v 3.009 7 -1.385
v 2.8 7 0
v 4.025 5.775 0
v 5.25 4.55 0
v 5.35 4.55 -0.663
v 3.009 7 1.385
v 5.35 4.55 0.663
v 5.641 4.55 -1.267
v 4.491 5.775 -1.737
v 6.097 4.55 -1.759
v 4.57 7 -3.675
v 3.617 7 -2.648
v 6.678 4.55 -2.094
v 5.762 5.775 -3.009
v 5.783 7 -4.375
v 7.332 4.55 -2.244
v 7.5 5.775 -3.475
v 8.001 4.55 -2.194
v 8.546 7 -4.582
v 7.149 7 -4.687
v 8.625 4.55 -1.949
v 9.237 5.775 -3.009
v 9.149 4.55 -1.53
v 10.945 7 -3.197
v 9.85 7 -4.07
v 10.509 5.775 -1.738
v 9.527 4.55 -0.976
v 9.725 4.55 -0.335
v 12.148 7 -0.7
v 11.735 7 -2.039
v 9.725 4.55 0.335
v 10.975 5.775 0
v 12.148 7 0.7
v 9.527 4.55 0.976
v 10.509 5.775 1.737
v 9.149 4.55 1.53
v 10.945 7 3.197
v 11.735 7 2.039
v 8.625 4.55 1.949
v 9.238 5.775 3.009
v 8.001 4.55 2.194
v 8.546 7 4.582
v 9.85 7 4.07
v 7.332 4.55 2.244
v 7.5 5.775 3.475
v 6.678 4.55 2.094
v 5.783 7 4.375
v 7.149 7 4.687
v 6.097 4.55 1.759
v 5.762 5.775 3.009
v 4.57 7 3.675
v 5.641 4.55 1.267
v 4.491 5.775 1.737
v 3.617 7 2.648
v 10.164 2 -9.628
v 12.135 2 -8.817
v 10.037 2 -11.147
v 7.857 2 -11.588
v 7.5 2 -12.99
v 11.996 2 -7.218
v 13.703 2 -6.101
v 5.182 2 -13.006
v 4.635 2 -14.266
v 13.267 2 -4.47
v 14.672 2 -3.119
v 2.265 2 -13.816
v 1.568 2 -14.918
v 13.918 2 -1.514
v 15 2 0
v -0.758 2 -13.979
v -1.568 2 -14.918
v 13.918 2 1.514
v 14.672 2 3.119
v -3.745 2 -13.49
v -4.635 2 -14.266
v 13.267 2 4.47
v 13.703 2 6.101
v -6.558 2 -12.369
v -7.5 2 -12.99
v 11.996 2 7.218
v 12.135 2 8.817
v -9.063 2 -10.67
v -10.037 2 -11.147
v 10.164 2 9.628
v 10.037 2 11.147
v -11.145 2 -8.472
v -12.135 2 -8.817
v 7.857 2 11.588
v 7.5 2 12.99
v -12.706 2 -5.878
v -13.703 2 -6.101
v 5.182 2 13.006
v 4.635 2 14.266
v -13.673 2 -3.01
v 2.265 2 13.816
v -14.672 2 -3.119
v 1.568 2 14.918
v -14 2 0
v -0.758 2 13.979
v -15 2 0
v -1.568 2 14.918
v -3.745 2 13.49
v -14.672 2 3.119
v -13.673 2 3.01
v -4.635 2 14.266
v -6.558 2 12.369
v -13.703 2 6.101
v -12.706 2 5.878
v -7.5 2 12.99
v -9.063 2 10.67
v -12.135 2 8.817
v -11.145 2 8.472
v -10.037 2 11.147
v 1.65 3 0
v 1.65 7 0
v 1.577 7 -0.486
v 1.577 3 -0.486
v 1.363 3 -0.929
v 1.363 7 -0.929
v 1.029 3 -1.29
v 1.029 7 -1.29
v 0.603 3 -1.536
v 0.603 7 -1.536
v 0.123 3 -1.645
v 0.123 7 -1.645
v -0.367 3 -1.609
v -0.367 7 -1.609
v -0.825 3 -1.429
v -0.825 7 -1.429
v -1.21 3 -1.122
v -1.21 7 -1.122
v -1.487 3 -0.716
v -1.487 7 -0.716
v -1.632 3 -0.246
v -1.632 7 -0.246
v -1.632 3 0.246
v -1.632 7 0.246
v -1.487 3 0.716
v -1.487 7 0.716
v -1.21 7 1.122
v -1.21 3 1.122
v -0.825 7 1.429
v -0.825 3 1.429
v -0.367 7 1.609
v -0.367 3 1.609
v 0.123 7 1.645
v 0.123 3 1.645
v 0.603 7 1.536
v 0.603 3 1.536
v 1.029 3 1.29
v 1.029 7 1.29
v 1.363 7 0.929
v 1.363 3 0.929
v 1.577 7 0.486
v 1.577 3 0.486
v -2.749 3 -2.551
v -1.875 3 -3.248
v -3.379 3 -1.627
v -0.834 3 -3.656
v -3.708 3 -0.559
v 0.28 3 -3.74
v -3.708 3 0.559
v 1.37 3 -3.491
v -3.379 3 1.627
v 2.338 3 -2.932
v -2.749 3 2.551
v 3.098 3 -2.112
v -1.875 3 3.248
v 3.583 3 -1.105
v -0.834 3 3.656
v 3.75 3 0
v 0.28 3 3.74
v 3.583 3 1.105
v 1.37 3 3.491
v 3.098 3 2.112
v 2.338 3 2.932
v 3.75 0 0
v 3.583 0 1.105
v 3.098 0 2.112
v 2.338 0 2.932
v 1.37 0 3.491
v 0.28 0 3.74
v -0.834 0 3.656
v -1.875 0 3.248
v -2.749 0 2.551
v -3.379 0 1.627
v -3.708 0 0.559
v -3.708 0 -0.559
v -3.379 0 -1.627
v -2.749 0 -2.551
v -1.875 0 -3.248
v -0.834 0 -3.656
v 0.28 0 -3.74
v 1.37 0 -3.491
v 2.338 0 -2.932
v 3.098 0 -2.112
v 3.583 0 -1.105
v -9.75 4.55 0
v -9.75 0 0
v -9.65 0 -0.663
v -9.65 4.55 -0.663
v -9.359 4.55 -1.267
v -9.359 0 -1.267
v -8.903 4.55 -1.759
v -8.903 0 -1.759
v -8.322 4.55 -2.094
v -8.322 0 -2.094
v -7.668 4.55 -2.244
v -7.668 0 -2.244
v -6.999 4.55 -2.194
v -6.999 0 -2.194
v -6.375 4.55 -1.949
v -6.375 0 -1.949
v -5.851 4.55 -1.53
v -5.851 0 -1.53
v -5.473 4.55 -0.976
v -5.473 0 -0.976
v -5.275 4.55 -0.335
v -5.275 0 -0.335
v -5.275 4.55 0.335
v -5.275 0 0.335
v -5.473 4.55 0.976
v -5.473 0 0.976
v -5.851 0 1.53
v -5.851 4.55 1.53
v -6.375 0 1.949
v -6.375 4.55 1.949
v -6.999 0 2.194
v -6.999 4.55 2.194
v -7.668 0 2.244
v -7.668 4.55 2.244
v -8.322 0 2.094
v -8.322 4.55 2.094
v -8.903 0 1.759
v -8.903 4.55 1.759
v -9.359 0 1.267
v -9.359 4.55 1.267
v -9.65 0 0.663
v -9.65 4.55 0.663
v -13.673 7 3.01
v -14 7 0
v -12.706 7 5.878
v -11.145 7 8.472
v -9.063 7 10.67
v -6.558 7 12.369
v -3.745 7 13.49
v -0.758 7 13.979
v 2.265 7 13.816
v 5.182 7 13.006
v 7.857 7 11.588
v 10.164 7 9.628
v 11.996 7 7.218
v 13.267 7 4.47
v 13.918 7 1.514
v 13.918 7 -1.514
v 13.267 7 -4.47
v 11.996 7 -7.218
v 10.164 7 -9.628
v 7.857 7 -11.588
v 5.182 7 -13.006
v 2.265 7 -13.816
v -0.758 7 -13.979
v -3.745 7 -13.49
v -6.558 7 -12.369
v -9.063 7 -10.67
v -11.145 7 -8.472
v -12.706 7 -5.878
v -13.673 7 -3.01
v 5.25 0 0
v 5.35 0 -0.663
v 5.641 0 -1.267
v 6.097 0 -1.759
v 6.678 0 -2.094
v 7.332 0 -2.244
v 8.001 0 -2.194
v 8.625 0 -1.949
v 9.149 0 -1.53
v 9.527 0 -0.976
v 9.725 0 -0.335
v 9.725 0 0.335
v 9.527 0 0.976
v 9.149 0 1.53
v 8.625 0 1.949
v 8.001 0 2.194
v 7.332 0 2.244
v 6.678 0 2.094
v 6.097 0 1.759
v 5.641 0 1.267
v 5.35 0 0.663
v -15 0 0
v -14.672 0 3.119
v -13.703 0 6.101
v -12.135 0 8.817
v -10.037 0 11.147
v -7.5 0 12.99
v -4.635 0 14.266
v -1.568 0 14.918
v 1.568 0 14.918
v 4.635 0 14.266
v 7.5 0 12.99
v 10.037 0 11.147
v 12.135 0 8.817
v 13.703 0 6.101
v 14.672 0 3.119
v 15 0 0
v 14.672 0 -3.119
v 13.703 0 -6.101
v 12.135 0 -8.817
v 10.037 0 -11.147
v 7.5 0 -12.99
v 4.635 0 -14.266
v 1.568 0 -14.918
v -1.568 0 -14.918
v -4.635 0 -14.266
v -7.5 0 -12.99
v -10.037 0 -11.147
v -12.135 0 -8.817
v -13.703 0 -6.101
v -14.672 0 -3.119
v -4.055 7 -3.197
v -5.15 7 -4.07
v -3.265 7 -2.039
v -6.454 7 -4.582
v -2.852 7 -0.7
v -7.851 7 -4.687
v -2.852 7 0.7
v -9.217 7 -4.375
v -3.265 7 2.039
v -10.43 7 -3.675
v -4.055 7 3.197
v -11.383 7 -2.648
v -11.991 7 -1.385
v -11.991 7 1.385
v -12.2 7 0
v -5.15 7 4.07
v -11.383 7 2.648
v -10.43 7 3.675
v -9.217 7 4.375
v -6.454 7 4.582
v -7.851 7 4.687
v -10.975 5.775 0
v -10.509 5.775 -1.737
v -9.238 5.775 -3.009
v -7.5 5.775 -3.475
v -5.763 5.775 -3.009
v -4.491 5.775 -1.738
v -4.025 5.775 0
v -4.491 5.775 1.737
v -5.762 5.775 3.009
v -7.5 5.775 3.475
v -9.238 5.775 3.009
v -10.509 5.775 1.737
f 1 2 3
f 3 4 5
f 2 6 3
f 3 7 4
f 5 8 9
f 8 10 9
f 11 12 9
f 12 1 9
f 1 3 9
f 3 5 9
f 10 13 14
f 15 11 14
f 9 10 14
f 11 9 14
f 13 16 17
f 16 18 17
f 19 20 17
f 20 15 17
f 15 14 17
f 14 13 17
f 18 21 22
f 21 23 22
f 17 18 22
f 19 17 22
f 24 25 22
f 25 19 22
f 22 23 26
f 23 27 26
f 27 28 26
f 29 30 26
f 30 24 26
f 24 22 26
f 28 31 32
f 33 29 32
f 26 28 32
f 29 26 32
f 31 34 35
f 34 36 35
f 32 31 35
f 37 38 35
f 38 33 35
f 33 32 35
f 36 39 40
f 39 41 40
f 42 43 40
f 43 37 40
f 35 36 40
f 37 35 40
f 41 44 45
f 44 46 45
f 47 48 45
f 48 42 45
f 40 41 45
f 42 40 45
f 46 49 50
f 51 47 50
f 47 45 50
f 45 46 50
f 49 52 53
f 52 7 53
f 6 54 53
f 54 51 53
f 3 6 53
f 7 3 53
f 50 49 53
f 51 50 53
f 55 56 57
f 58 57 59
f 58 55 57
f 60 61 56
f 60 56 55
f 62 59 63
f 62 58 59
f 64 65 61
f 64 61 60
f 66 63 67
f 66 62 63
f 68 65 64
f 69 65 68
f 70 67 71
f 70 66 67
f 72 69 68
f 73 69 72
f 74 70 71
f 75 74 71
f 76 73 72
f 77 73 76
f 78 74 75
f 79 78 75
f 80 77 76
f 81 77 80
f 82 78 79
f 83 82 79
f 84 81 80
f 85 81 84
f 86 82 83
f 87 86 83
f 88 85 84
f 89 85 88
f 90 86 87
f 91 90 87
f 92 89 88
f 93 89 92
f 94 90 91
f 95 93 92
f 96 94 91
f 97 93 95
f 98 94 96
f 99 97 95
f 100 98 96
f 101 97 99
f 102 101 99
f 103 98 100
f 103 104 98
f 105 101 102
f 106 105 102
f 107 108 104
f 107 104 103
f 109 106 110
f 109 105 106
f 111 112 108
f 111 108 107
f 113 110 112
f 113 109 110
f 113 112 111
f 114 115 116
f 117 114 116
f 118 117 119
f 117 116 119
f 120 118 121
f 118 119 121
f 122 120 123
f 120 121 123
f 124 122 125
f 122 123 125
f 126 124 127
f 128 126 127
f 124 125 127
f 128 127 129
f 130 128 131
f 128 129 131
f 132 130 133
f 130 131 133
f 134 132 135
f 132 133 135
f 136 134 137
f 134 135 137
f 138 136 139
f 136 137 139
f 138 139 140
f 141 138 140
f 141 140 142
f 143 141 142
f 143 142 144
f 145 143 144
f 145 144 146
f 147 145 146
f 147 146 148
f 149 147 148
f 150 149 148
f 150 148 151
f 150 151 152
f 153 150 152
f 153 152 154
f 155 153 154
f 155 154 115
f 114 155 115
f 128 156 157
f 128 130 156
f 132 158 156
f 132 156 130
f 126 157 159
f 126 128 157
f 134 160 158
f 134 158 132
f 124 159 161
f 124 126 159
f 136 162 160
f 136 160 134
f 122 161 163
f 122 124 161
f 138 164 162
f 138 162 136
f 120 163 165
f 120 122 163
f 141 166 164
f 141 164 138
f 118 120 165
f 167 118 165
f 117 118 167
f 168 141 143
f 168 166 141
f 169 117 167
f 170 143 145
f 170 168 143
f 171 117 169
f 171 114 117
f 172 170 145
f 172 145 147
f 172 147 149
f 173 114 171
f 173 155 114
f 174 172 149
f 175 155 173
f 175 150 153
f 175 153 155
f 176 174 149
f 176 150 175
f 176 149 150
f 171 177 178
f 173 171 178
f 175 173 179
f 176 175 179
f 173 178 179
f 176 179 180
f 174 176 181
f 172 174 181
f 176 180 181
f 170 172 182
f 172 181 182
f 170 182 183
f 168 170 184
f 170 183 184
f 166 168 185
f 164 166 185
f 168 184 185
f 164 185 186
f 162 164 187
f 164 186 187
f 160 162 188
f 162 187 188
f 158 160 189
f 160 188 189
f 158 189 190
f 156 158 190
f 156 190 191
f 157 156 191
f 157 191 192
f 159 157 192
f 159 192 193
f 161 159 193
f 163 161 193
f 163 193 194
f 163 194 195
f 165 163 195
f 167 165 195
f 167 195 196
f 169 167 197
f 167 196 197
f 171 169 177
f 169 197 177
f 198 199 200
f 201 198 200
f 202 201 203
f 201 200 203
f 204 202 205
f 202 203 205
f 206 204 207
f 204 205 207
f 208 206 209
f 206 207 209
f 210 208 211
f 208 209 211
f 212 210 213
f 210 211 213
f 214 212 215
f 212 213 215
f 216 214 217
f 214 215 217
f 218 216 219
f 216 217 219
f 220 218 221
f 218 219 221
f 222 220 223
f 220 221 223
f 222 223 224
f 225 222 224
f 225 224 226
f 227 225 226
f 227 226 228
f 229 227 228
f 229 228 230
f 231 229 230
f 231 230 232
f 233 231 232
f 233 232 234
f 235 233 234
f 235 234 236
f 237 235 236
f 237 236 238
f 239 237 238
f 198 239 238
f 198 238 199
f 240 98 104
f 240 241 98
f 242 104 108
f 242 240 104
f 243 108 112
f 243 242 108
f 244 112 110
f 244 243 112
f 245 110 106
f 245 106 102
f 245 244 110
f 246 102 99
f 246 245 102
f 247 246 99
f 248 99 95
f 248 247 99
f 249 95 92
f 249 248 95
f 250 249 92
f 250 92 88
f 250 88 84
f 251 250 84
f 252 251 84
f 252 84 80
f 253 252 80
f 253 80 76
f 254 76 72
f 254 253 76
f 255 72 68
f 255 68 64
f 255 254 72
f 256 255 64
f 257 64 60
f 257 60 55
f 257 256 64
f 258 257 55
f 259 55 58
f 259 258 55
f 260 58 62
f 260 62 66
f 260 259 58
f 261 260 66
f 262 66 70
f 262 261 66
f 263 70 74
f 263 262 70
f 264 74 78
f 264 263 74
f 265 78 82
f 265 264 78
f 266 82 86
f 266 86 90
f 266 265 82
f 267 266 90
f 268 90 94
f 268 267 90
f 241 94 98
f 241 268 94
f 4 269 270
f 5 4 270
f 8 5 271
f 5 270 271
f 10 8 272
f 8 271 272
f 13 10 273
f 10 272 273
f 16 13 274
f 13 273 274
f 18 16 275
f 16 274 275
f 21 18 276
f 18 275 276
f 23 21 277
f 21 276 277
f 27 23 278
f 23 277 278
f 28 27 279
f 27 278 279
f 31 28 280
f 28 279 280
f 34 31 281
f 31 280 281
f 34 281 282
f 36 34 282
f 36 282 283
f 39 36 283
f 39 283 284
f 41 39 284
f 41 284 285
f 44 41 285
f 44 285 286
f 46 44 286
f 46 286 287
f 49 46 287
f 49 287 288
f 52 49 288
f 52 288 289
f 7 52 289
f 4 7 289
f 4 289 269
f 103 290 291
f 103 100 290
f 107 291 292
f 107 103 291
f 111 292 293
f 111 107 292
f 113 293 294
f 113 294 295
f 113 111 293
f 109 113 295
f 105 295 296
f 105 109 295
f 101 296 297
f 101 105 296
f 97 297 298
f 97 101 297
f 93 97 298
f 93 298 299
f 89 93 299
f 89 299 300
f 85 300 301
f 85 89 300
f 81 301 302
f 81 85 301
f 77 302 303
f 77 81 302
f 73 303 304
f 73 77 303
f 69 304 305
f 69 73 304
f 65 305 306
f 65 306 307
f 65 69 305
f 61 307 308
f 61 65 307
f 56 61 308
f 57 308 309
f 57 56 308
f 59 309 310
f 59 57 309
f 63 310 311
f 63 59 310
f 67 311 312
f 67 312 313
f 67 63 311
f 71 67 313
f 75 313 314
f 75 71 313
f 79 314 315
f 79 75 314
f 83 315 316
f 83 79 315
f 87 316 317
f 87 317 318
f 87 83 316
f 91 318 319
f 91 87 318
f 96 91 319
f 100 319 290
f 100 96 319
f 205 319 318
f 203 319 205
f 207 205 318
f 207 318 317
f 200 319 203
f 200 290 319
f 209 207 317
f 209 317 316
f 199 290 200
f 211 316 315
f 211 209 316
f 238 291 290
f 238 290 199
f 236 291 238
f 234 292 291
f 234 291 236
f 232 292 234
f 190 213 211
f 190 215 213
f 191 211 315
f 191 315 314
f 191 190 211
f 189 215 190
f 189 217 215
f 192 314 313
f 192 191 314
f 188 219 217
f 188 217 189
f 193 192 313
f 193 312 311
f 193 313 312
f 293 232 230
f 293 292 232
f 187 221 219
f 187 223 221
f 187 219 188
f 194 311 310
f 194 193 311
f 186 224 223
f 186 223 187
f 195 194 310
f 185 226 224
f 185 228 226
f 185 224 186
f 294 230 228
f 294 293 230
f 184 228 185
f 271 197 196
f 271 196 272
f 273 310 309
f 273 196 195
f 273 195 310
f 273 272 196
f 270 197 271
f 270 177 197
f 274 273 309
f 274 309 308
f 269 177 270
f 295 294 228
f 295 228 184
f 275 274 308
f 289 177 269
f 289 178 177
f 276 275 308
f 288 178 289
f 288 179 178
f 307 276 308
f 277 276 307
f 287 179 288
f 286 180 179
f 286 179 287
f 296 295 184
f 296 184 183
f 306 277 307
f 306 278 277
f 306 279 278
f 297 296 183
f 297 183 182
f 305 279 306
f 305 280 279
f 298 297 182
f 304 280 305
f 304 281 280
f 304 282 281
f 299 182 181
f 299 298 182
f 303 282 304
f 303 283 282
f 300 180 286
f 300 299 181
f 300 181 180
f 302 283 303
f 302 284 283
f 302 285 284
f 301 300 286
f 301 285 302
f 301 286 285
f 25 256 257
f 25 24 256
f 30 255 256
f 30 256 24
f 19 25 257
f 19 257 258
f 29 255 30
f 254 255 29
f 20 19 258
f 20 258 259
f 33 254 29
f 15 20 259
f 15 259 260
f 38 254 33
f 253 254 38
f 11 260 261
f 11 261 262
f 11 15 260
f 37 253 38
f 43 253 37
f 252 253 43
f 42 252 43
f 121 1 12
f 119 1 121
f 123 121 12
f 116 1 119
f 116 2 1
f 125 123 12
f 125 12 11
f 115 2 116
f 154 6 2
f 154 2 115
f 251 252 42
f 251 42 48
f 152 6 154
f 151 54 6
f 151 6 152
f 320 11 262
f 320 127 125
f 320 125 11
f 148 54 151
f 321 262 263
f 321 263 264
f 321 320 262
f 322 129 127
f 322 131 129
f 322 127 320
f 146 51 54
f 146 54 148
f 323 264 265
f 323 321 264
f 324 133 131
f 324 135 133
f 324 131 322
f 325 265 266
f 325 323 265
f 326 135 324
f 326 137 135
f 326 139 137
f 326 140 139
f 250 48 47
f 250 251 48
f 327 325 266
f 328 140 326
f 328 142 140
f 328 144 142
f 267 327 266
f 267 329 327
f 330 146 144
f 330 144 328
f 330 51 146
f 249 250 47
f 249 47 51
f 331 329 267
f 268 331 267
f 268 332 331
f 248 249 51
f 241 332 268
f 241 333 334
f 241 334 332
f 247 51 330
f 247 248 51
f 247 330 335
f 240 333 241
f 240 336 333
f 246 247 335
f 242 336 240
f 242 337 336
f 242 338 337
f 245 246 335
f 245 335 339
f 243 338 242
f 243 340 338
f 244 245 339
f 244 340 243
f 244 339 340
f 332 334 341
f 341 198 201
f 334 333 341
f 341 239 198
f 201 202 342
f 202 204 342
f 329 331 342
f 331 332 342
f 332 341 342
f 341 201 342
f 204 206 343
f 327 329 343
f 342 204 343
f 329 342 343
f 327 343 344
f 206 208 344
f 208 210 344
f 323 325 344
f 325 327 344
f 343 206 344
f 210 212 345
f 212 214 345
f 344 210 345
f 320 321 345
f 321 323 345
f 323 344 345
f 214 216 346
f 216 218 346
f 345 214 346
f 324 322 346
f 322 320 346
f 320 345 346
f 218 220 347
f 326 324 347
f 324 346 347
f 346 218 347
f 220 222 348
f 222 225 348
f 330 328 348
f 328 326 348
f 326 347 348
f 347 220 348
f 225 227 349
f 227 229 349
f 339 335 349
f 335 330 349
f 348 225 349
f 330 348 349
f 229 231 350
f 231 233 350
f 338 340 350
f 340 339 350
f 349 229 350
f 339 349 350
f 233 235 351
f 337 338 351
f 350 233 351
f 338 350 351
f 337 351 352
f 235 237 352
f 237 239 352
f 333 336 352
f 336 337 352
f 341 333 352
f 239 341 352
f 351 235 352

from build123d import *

# Parameters (mm, degrees)
HOLE_WIZARD_M4_1_D           = 4.5
HOLE_WIZARD_M4_1_DEPTH       = 7
HOLE_WIZARD_M4_1_CSINK_D     = 9.4
HOLE_WIZARD_M4_1_CSINK_ANGLE = 90
SKETCH_4_R                   = 3.75
CUT_EXTRUDE_M4_DEPTH         = 3
HOLE_WIZARD_M4_1_2_D         = 3.3
HOLE_WIZARD_M4_1_2_DEPTH     = 4


with BuildPart() as part:
    # 스케치1 → 회전1 (revolve)
    with BuildSketch(Plane.XY):
        Polygon((0, 0), (-15, 0), (-15, 2), (-14, 2), (-14, 7), (0, 7), align=None)
    revolve(axis=Axis((0, 0, 0), (0, 1, 0)))

    # Hole Wizard M4 _ _ _ _1
    with Locations(Plane(origin=(0, 7, 0), x_dir=(1, 0, 0), z_dir=(0, 1, 0))):
        with Locations((-7.5, 0), (7.5, 0)):
            CounterSinkHole(HOLE_WIZARD_M4_1_D / 2, HOLE_WIZARD_M4_1_CSINK_D / 2, depth=HOLE_WIZARD_M4_1_DEPTH, counter_sink_angle=HOLE_WIZARD_M4_1_CSINK_ANGLE)

    # 스케치4 → M4 둥근 머리 나사용 카운터싱크 (cut)
    with BuildSketch(Plane.XZ):
        Circle(SKETCH_4_R)
    extrude(amount=-CUT_EXTRUDE_M4_DEPTH, mode=Mode.SUBTRACT)

    # Hole Wizard M4 _ _1 2
    with Locations(Plane(origin=(0, 3, 0), x_dir=(-1, 0, 0), z_dir=(0, -1, 0))):
        with Locations((0, 0)):
            Hole(HOLE_WIZARD_M4_1_2_D / 2, depth=HOLE_WIZARD_M4_1_2_DEPTH)


solid = part.part
